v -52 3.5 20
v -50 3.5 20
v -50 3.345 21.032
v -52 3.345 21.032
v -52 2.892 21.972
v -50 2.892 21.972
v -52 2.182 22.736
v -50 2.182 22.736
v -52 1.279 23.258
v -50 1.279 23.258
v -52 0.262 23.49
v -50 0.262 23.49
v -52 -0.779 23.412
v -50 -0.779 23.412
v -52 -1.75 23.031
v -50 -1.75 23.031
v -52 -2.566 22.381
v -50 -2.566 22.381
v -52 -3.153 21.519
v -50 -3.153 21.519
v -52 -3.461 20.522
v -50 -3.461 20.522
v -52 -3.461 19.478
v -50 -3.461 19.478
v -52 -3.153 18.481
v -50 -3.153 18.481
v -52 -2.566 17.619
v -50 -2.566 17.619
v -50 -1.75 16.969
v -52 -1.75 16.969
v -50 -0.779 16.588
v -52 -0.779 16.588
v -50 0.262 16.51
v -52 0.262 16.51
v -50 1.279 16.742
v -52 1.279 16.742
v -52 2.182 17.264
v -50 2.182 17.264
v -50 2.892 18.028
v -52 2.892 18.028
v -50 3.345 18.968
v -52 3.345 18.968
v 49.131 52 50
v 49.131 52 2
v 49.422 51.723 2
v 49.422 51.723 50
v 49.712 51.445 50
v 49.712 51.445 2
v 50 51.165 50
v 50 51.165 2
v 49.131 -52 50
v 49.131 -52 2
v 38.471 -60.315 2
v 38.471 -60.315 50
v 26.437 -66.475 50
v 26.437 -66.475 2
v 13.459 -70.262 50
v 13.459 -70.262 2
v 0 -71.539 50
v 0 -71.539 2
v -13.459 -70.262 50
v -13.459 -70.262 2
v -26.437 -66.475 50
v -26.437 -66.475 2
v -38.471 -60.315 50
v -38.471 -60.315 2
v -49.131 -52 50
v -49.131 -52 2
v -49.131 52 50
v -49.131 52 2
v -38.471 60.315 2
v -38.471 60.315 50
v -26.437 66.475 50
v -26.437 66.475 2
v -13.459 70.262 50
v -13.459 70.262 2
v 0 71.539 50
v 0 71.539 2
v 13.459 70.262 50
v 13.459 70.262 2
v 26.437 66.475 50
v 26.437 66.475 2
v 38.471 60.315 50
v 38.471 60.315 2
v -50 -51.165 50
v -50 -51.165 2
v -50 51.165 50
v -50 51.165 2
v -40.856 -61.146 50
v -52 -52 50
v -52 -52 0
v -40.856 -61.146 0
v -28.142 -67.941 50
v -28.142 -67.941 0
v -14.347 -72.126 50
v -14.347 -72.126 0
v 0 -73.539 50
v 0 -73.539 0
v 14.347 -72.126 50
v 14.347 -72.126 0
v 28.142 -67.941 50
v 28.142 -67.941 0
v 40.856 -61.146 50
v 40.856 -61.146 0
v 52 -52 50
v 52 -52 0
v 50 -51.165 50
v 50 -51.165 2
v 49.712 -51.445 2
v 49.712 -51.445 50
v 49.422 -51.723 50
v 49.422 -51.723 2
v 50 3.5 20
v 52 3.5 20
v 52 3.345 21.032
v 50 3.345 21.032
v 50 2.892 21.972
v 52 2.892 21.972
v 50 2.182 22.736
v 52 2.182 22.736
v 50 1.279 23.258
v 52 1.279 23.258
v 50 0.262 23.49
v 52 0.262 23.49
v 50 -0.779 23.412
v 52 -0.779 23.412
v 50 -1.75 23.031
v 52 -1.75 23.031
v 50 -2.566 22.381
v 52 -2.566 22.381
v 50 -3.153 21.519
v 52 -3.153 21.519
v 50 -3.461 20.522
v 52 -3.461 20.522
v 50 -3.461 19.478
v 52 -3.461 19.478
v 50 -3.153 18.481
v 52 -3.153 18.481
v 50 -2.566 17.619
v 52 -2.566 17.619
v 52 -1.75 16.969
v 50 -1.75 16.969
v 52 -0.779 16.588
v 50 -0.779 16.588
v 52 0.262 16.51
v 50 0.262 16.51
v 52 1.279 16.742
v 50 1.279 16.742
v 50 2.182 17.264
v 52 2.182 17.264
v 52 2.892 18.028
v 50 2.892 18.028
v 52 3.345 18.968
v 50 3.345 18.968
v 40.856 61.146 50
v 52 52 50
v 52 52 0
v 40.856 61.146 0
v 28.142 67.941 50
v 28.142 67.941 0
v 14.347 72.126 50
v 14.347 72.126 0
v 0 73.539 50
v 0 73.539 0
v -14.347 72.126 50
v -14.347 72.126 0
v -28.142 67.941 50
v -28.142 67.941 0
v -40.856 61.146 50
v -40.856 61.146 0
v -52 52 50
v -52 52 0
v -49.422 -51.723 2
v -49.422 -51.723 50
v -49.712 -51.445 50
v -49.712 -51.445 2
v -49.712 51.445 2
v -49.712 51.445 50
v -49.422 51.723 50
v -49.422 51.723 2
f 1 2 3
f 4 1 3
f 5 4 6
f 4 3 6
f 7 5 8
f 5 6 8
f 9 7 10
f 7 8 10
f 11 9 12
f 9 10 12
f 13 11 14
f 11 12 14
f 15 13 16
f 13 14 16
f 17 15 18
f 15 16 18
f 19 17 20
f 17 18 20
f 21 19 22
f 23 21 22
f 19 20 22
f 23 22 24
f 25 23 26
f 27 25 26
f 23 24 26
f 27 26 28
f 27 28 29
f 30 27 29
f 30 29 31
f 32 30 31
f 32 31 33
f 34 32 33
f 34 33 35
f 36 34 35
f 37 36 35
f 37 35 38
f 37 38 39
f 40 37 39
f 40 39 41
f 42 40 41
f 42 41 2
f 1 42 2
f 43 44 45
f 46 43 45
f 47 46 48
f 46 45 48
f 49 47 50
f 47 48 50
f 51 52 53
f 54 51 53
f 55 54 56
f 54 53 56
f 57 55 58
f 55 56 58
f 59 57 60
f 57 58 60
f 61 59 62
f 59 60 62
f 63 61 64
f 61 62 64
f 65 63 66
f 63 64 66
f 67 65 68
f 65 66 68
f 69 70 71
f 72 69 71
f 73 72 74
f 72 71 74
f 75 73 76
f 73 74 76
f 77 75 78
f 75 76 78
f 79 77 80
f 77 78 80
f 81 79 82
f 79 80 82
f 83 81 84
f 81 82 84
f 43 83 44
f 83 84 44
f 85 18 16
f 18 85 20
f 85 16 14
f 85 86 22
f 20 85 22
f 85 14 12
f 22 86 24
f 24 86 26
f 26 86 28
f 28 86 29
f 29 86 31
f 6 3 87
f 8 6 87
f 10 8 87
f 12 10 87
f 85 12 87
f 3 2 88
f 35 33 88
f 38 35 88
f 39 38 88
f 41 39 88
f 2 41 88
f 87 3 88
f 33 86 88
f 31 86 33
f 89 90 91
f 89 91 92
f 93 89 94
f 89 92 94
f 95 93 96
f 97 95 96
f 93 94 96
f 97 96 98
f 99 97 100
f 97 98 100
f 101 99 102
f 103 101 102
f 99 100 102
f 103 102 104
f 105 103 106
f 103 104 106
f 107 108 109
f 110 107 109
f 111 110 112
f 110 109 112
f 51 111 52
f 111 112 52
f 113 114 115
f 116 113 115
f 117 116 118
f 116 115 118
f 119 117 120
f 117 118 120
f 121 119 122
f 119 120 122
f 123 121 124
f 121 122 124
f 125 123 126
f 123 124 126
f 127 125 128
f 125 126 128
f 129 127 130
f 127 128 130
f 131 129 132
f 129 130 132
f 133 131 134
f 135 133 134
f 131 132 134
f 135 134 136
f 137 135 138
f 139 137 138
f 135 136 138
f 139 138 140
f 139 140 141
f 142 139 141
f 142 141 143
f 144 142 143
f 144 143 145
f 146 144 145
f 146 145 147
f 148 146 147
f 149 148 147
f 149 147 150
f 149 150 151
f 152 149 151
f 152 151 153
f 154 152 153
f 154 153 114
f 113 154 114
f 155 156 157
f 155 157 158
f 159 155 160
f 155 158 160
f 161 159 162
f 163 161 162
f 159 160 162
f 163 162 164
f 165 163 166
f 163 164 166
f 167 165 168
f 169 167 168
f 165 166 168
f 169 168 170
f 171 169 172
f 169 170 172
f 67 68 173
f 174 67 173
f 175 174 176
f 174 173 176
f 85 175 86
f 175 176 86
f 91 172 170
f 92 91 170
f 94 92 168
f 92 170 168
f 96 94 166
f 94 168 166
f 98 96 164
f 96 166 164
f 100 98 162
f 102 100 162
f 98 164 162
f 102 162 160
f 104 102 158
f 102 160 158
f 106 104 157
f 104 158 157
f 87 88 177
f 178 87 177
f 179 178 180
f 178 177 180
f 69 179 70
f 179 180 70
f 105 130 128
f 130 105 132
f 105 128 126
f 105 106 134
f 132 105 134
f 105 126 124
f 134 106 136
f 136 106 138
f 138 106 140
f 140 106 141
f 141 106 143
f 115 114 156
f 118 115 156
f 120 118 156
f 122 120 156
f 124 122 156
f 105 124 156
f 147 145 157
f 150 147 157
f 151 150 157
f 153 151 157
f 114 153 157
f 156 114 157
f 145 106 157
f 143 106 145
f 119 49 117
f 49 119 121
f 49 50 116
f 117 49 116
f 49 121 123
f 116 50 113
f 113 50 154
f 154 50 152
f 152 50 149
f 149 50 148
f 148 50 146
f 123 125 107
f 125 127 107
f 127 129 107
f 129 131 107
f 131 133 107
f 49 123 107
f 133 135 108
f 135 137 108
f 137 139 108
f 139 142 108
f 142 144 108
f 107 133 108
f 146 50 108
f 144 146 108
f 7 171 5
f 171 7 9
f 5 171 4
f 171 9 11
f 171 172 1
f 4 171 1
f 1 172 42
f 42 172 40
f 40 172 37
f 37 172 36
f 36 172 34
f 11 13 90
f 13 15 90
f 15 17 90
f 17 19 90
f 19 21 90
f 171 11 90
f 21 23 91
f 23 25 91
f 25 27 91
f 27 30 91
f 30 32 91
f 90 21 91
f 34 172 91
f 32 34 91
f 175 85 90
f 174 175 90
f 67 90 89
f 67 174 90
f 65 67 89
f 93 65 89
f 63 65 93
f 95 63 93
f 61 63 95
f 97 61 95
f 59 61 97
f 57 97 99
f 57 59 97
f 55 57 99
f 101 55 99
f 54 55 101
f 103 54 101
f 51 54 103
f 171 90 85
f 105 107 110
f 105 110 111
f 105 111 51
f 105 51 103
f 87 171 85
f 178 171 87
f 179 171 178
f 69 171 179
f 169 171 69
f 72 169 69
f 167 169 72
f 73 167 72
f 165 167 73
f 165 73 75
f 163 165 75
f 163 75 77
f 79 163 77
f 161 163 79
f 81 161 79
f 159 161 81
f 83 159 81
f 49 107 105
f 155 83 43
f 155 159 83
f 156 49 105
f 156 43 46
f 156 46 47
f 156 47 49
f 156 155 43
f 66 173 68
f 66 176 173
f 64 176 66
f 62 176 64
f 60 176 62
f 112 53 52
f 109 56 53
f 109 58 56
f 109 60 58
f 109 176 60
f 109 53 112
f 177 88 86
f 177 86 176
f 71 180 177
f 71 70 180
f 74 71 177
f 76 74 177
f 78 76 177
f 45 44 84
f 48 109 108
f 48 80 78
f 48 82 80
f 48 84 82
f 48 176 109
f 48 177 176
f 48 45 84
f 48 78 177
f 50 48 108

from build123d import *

# Parameters (mm, degrees)
F0_W     = 100
F0_H     = 100
F1_DEPTH = 2
F2_DEPTH = 50
F3_R     = 3.5
F4_DEPTH = 104.001


with BuildPart() as f1:
    # F0 (on Top) → F1 (new body)
    with BuildSketch(Plane.XY):
        with BuildLine():
            ThreePointArc((-49.1308821316, -52), (0, -71.5391052434), (49.1308821316, -52))
            Line((49.1308821316, -52), (-49.1308821316, -52))
        make_face()
        Rectangle(F0_W, F0_H)
        with BuildLine():
            Line((-49.1308821316, 52), (49.1308821316, 52))
            ThreePointArc((49.1308821316, 52), (0, 71.5391052434), (-49.1308821316, 52))
        make_face()
        with BuildLine():
            Line((49.1308821316, 52), (52, 52))
            ThreePointArc((52, 52), (0, 73.5391052434), (-52, 52))
            Line((-52, 52), (-49.1308821316, 52))
            ThreePointArc((-49.1308821316, 52), (0, 71.5391052434), (49.1308821316, 52))
        make_face()
        with BuildLine():
            ThreePointArc((50, 51.1648666472), (49.5671999408, 51.5842637735), (49.1308821316, 52))
            Line((49.1308821316, 52), (-49.1308821316, 52))
            ThreePointArc((-49.1308821316, 52), (-49.5671999408, 51.5842637735), (-50, 51.1648666472))
            Line((-50, 51.1648666472), (-50, 50))
            Line((-50, 50), (50, 50))
            Line((50, 50), (50, 51.1648666472))
        make_face()
        with BuildLine():
            Line((-49.1308821316, 52), (-52, 52))
            Line((-52, 52), (-52, 49.1308821316))
            ThreePointArc((-52, 49.1308821316), (-51.010138926, 50.1578439107), (-50, 51.1648666472))
            ThreePointArc((-50, 51.1648666472), (-49.5671999408, 51.5842637735), (-49.1308821316, 52))
        make_face()
        with BuildLine():
            Line((52, 49.1308821316), (52, 52))
            Line((52, 52), (49.1308821316, 52))
            ThreePointArc((49.1308821316, 52), (49.5671999408, 51.5842637735), (50, 51.1648666472))
            ThreePointArc((50, 51.1648666472), (51.010138926, 50.1578439107), (52, 49.1308821316))
        make_face()
        with BuildLine():
            Line((49.1308821316, -52), (52, -52))
            Line((52, -52), (52, -49.1308821316))
            ThreePointArc((52, -49.1308821316), (51.010138926, -50.1578439107), (50, -51.1648666472))
            ThreePointArc((50, -51.1648666472), (49.5671999408, -51.5842637735), (49.1308821316, -52))
        make_face()
        with BuildLine():
            ThreePointArc((-52, -52), (0, -73.5391052434), (52, -52))
            Line((52, -52), (49.1308821316, -52))
            ThreePointArc((49.1308821316, -52), (0, -71.5391052434), (-49.1308821316, -52))
            Line((-49.1308821316, -52), (-52, -52))
        make_face()
        with BuildLine():
            Line((-52, -49.1308821316), (-52, -52))
            Line((-52, -52), (-49.1308821316, -52))
            ThreePointArc((-49.1308821316, -52), (-49.5671999408, -51.5842637735), (-50, -51.1648666472))
            ThreePointArc((-50, -51.1648666472), (-51.010138926, -50.1578439107), (-52, -49.1308821316))
        make_face()
        with BuildLine():
            ThreePointArc((-50, 51.1648666472), (-51.010138926, 50.1578439107), (-52, 49.1308821316))
            Line((-52, 49.1308821316), (-52, -49.1308821316))
            ThreePointArc((-52, -49.1308821316), (-51.010138926, -50.1578439107), (-50, -51.1648666472))
            Line((-50, -51.1648666472), (-50, -50))
            Line((-50, -50), (-50, 50))
            Line((-50, 50), (-50, 51.1648666472))
        make_face()
        with BuildLine():
            Line((52, -49.1308821316), (52, 49.1308821316))
            ThreePointArc((52, 49.1308821316), (51.010138926, 50.1578439107), (50, 51.1648666472))
            Line((50, 51.1648666472), (50, 50))
            Line((50, 50), (50, -50))
            Line((50, -50), (50, -51.1648666472))
            ThreePointArc((50, -51.1648666472), (51.010138926, -50.1578439107), (52, -49.1308821316))
        make_face()
        with BuildLine():
            Line((-49.1308821316, -52), (49.1308821316, -52))
            ThreePointArc((49.1308821316, -52), (49.5671999408, -51.5842637735), (50, -51.1648666472))
            Line((50, -51.1648666472), (50, -50))
            Line((50, -50), (-50, -50))
            Line((-50, -50), (-50, -51.1648666472))
            ThreePointArc((-50, -51.1648666472), (-49.5671999408, -51.5842637735), (-49.1308821316, -52))
        make_face()
    extrude(amount=F1_DEPTH)

    # F0 (on Top) → F2 (join)
    with BuildSketch(Plane.XY):
        with BuildLine():
            ThreePointArc((-50, 51.1648666472), (-51.010138926, 50.1578439107), (-52, 49.1308821316))
            Line((-52, 49.1308821316), (-52, -49.1308821316))
            ThreePointArc((-52, -49.1308821316), (-51.010138926, -50.1578439107), (-50, -51.1648666472))
            Line((-50, -51.1648666472), (-50, -50))
            Line((-50, -50), (-50, 50))
            Line((-50, 50), (-50, 51.1648666472))
        make_face()
        with BuildLine():
            Line((-49.1308821316, 52), (-52, 52))
            Line((-52, 52), (-52, 49.1308821316))
            ThreePointArc((-52, 49.1308821316), (-51.010138926, 50.1578439107), (-50, 51.1648666472))
            ThreePointArc((-50, 51.1648666472), (-49.5671999408, 51.5842637735), (-49.1308821316, 52))
        make_face()
        with BuildLine():
            Line((49.1308821316, 52), (52, 52))
            ThreePointArc((52, 52), (0, 73.5391052434), (-52, 52))
            Line((-52, 52), (-49.1308821316, 52))
            ThreePointArc((-49.1308821316, 52), (0, 71.5391052434), (49.1308821316, 52))
        make_face()
        with BuildLine():
            Line((52, -49.1308821316), (52, 49.1308821316))
            ThreePointArc((52, 49.1308821316), (51.010138926, 50.1578439107), (50, 51.1648666472))
            Line((50, 51.1648666472), (50, 50))
            Line((50, 50), (50, -50))
            Line((50, -50), (50, -51.1648666472))
            ThreePointArc((50, -51.1648666472), (51.010138926, -50.1578439107), (52, -49.1308821316))
        make_face()
        with BuildLine():
            Line((52, 49.1308821316), (52, 52))
            Line((52, 52), (49.1308821316, 52))
            ThreePointArc((49.1308821316, 52), (49.5671999408, 51.5842637735), (50, 51.1648666472))
            ThreePointArc((50, 51.1648666472), (51.010138926, 50.1578439107), (52, 49.1308821316))
        make_face()
        with BuildLine():
            Line((49.1308821316, -52), (52, -52))
            Line((52, -52), (52, -49.1308821316))
            ThreePointArc((52, -49.1308821316), (51.010138926, -50.1578439107), (50, -51.1648666472))
            ThreePointArc((50, -51.1648666472), (49.5671999408, -51.5842637735), (49.1308821316, -52))
        make_face()
        with BuildLine():
            ThreePointArc((-52, -52), (0, -73.5391052434), (52, -52))
            Line((52, -52), (49.1308821316, -52))
            ThreePointArc((49.1308821316, -52), (0, -71.5391052434), (-49.1308821316, -52))
            Line((-49.1308821316, -52), (-52, -52))
        make_face()
        with BuildLine():
            Line((-52, -49.1308821316), (-52, -52))
            Line((-52, -52), (-49.1308821316, -52))
            ThreePointArc((-49.1308821316, -52), (-49.5671999408, -51.5842637735), (-50, -51.1648666472))
            ThreePointArc((-50, -51.1648666472), (-51.010138926, -50.1578439107), (-52, -49.1308821316))
        make_face()
    extrude(amount=F2_DEPTH)

    # F3 (on face) → F4 (cut, through all)
    with BuildSketch(Plane.YZ.offset(52)):
        with Locations((0, 20)):
            Circle(F3_R)
    extrude(amount=-F4_DEPTH, mode=Mode.SUBTRACT)


solid = f1.part
